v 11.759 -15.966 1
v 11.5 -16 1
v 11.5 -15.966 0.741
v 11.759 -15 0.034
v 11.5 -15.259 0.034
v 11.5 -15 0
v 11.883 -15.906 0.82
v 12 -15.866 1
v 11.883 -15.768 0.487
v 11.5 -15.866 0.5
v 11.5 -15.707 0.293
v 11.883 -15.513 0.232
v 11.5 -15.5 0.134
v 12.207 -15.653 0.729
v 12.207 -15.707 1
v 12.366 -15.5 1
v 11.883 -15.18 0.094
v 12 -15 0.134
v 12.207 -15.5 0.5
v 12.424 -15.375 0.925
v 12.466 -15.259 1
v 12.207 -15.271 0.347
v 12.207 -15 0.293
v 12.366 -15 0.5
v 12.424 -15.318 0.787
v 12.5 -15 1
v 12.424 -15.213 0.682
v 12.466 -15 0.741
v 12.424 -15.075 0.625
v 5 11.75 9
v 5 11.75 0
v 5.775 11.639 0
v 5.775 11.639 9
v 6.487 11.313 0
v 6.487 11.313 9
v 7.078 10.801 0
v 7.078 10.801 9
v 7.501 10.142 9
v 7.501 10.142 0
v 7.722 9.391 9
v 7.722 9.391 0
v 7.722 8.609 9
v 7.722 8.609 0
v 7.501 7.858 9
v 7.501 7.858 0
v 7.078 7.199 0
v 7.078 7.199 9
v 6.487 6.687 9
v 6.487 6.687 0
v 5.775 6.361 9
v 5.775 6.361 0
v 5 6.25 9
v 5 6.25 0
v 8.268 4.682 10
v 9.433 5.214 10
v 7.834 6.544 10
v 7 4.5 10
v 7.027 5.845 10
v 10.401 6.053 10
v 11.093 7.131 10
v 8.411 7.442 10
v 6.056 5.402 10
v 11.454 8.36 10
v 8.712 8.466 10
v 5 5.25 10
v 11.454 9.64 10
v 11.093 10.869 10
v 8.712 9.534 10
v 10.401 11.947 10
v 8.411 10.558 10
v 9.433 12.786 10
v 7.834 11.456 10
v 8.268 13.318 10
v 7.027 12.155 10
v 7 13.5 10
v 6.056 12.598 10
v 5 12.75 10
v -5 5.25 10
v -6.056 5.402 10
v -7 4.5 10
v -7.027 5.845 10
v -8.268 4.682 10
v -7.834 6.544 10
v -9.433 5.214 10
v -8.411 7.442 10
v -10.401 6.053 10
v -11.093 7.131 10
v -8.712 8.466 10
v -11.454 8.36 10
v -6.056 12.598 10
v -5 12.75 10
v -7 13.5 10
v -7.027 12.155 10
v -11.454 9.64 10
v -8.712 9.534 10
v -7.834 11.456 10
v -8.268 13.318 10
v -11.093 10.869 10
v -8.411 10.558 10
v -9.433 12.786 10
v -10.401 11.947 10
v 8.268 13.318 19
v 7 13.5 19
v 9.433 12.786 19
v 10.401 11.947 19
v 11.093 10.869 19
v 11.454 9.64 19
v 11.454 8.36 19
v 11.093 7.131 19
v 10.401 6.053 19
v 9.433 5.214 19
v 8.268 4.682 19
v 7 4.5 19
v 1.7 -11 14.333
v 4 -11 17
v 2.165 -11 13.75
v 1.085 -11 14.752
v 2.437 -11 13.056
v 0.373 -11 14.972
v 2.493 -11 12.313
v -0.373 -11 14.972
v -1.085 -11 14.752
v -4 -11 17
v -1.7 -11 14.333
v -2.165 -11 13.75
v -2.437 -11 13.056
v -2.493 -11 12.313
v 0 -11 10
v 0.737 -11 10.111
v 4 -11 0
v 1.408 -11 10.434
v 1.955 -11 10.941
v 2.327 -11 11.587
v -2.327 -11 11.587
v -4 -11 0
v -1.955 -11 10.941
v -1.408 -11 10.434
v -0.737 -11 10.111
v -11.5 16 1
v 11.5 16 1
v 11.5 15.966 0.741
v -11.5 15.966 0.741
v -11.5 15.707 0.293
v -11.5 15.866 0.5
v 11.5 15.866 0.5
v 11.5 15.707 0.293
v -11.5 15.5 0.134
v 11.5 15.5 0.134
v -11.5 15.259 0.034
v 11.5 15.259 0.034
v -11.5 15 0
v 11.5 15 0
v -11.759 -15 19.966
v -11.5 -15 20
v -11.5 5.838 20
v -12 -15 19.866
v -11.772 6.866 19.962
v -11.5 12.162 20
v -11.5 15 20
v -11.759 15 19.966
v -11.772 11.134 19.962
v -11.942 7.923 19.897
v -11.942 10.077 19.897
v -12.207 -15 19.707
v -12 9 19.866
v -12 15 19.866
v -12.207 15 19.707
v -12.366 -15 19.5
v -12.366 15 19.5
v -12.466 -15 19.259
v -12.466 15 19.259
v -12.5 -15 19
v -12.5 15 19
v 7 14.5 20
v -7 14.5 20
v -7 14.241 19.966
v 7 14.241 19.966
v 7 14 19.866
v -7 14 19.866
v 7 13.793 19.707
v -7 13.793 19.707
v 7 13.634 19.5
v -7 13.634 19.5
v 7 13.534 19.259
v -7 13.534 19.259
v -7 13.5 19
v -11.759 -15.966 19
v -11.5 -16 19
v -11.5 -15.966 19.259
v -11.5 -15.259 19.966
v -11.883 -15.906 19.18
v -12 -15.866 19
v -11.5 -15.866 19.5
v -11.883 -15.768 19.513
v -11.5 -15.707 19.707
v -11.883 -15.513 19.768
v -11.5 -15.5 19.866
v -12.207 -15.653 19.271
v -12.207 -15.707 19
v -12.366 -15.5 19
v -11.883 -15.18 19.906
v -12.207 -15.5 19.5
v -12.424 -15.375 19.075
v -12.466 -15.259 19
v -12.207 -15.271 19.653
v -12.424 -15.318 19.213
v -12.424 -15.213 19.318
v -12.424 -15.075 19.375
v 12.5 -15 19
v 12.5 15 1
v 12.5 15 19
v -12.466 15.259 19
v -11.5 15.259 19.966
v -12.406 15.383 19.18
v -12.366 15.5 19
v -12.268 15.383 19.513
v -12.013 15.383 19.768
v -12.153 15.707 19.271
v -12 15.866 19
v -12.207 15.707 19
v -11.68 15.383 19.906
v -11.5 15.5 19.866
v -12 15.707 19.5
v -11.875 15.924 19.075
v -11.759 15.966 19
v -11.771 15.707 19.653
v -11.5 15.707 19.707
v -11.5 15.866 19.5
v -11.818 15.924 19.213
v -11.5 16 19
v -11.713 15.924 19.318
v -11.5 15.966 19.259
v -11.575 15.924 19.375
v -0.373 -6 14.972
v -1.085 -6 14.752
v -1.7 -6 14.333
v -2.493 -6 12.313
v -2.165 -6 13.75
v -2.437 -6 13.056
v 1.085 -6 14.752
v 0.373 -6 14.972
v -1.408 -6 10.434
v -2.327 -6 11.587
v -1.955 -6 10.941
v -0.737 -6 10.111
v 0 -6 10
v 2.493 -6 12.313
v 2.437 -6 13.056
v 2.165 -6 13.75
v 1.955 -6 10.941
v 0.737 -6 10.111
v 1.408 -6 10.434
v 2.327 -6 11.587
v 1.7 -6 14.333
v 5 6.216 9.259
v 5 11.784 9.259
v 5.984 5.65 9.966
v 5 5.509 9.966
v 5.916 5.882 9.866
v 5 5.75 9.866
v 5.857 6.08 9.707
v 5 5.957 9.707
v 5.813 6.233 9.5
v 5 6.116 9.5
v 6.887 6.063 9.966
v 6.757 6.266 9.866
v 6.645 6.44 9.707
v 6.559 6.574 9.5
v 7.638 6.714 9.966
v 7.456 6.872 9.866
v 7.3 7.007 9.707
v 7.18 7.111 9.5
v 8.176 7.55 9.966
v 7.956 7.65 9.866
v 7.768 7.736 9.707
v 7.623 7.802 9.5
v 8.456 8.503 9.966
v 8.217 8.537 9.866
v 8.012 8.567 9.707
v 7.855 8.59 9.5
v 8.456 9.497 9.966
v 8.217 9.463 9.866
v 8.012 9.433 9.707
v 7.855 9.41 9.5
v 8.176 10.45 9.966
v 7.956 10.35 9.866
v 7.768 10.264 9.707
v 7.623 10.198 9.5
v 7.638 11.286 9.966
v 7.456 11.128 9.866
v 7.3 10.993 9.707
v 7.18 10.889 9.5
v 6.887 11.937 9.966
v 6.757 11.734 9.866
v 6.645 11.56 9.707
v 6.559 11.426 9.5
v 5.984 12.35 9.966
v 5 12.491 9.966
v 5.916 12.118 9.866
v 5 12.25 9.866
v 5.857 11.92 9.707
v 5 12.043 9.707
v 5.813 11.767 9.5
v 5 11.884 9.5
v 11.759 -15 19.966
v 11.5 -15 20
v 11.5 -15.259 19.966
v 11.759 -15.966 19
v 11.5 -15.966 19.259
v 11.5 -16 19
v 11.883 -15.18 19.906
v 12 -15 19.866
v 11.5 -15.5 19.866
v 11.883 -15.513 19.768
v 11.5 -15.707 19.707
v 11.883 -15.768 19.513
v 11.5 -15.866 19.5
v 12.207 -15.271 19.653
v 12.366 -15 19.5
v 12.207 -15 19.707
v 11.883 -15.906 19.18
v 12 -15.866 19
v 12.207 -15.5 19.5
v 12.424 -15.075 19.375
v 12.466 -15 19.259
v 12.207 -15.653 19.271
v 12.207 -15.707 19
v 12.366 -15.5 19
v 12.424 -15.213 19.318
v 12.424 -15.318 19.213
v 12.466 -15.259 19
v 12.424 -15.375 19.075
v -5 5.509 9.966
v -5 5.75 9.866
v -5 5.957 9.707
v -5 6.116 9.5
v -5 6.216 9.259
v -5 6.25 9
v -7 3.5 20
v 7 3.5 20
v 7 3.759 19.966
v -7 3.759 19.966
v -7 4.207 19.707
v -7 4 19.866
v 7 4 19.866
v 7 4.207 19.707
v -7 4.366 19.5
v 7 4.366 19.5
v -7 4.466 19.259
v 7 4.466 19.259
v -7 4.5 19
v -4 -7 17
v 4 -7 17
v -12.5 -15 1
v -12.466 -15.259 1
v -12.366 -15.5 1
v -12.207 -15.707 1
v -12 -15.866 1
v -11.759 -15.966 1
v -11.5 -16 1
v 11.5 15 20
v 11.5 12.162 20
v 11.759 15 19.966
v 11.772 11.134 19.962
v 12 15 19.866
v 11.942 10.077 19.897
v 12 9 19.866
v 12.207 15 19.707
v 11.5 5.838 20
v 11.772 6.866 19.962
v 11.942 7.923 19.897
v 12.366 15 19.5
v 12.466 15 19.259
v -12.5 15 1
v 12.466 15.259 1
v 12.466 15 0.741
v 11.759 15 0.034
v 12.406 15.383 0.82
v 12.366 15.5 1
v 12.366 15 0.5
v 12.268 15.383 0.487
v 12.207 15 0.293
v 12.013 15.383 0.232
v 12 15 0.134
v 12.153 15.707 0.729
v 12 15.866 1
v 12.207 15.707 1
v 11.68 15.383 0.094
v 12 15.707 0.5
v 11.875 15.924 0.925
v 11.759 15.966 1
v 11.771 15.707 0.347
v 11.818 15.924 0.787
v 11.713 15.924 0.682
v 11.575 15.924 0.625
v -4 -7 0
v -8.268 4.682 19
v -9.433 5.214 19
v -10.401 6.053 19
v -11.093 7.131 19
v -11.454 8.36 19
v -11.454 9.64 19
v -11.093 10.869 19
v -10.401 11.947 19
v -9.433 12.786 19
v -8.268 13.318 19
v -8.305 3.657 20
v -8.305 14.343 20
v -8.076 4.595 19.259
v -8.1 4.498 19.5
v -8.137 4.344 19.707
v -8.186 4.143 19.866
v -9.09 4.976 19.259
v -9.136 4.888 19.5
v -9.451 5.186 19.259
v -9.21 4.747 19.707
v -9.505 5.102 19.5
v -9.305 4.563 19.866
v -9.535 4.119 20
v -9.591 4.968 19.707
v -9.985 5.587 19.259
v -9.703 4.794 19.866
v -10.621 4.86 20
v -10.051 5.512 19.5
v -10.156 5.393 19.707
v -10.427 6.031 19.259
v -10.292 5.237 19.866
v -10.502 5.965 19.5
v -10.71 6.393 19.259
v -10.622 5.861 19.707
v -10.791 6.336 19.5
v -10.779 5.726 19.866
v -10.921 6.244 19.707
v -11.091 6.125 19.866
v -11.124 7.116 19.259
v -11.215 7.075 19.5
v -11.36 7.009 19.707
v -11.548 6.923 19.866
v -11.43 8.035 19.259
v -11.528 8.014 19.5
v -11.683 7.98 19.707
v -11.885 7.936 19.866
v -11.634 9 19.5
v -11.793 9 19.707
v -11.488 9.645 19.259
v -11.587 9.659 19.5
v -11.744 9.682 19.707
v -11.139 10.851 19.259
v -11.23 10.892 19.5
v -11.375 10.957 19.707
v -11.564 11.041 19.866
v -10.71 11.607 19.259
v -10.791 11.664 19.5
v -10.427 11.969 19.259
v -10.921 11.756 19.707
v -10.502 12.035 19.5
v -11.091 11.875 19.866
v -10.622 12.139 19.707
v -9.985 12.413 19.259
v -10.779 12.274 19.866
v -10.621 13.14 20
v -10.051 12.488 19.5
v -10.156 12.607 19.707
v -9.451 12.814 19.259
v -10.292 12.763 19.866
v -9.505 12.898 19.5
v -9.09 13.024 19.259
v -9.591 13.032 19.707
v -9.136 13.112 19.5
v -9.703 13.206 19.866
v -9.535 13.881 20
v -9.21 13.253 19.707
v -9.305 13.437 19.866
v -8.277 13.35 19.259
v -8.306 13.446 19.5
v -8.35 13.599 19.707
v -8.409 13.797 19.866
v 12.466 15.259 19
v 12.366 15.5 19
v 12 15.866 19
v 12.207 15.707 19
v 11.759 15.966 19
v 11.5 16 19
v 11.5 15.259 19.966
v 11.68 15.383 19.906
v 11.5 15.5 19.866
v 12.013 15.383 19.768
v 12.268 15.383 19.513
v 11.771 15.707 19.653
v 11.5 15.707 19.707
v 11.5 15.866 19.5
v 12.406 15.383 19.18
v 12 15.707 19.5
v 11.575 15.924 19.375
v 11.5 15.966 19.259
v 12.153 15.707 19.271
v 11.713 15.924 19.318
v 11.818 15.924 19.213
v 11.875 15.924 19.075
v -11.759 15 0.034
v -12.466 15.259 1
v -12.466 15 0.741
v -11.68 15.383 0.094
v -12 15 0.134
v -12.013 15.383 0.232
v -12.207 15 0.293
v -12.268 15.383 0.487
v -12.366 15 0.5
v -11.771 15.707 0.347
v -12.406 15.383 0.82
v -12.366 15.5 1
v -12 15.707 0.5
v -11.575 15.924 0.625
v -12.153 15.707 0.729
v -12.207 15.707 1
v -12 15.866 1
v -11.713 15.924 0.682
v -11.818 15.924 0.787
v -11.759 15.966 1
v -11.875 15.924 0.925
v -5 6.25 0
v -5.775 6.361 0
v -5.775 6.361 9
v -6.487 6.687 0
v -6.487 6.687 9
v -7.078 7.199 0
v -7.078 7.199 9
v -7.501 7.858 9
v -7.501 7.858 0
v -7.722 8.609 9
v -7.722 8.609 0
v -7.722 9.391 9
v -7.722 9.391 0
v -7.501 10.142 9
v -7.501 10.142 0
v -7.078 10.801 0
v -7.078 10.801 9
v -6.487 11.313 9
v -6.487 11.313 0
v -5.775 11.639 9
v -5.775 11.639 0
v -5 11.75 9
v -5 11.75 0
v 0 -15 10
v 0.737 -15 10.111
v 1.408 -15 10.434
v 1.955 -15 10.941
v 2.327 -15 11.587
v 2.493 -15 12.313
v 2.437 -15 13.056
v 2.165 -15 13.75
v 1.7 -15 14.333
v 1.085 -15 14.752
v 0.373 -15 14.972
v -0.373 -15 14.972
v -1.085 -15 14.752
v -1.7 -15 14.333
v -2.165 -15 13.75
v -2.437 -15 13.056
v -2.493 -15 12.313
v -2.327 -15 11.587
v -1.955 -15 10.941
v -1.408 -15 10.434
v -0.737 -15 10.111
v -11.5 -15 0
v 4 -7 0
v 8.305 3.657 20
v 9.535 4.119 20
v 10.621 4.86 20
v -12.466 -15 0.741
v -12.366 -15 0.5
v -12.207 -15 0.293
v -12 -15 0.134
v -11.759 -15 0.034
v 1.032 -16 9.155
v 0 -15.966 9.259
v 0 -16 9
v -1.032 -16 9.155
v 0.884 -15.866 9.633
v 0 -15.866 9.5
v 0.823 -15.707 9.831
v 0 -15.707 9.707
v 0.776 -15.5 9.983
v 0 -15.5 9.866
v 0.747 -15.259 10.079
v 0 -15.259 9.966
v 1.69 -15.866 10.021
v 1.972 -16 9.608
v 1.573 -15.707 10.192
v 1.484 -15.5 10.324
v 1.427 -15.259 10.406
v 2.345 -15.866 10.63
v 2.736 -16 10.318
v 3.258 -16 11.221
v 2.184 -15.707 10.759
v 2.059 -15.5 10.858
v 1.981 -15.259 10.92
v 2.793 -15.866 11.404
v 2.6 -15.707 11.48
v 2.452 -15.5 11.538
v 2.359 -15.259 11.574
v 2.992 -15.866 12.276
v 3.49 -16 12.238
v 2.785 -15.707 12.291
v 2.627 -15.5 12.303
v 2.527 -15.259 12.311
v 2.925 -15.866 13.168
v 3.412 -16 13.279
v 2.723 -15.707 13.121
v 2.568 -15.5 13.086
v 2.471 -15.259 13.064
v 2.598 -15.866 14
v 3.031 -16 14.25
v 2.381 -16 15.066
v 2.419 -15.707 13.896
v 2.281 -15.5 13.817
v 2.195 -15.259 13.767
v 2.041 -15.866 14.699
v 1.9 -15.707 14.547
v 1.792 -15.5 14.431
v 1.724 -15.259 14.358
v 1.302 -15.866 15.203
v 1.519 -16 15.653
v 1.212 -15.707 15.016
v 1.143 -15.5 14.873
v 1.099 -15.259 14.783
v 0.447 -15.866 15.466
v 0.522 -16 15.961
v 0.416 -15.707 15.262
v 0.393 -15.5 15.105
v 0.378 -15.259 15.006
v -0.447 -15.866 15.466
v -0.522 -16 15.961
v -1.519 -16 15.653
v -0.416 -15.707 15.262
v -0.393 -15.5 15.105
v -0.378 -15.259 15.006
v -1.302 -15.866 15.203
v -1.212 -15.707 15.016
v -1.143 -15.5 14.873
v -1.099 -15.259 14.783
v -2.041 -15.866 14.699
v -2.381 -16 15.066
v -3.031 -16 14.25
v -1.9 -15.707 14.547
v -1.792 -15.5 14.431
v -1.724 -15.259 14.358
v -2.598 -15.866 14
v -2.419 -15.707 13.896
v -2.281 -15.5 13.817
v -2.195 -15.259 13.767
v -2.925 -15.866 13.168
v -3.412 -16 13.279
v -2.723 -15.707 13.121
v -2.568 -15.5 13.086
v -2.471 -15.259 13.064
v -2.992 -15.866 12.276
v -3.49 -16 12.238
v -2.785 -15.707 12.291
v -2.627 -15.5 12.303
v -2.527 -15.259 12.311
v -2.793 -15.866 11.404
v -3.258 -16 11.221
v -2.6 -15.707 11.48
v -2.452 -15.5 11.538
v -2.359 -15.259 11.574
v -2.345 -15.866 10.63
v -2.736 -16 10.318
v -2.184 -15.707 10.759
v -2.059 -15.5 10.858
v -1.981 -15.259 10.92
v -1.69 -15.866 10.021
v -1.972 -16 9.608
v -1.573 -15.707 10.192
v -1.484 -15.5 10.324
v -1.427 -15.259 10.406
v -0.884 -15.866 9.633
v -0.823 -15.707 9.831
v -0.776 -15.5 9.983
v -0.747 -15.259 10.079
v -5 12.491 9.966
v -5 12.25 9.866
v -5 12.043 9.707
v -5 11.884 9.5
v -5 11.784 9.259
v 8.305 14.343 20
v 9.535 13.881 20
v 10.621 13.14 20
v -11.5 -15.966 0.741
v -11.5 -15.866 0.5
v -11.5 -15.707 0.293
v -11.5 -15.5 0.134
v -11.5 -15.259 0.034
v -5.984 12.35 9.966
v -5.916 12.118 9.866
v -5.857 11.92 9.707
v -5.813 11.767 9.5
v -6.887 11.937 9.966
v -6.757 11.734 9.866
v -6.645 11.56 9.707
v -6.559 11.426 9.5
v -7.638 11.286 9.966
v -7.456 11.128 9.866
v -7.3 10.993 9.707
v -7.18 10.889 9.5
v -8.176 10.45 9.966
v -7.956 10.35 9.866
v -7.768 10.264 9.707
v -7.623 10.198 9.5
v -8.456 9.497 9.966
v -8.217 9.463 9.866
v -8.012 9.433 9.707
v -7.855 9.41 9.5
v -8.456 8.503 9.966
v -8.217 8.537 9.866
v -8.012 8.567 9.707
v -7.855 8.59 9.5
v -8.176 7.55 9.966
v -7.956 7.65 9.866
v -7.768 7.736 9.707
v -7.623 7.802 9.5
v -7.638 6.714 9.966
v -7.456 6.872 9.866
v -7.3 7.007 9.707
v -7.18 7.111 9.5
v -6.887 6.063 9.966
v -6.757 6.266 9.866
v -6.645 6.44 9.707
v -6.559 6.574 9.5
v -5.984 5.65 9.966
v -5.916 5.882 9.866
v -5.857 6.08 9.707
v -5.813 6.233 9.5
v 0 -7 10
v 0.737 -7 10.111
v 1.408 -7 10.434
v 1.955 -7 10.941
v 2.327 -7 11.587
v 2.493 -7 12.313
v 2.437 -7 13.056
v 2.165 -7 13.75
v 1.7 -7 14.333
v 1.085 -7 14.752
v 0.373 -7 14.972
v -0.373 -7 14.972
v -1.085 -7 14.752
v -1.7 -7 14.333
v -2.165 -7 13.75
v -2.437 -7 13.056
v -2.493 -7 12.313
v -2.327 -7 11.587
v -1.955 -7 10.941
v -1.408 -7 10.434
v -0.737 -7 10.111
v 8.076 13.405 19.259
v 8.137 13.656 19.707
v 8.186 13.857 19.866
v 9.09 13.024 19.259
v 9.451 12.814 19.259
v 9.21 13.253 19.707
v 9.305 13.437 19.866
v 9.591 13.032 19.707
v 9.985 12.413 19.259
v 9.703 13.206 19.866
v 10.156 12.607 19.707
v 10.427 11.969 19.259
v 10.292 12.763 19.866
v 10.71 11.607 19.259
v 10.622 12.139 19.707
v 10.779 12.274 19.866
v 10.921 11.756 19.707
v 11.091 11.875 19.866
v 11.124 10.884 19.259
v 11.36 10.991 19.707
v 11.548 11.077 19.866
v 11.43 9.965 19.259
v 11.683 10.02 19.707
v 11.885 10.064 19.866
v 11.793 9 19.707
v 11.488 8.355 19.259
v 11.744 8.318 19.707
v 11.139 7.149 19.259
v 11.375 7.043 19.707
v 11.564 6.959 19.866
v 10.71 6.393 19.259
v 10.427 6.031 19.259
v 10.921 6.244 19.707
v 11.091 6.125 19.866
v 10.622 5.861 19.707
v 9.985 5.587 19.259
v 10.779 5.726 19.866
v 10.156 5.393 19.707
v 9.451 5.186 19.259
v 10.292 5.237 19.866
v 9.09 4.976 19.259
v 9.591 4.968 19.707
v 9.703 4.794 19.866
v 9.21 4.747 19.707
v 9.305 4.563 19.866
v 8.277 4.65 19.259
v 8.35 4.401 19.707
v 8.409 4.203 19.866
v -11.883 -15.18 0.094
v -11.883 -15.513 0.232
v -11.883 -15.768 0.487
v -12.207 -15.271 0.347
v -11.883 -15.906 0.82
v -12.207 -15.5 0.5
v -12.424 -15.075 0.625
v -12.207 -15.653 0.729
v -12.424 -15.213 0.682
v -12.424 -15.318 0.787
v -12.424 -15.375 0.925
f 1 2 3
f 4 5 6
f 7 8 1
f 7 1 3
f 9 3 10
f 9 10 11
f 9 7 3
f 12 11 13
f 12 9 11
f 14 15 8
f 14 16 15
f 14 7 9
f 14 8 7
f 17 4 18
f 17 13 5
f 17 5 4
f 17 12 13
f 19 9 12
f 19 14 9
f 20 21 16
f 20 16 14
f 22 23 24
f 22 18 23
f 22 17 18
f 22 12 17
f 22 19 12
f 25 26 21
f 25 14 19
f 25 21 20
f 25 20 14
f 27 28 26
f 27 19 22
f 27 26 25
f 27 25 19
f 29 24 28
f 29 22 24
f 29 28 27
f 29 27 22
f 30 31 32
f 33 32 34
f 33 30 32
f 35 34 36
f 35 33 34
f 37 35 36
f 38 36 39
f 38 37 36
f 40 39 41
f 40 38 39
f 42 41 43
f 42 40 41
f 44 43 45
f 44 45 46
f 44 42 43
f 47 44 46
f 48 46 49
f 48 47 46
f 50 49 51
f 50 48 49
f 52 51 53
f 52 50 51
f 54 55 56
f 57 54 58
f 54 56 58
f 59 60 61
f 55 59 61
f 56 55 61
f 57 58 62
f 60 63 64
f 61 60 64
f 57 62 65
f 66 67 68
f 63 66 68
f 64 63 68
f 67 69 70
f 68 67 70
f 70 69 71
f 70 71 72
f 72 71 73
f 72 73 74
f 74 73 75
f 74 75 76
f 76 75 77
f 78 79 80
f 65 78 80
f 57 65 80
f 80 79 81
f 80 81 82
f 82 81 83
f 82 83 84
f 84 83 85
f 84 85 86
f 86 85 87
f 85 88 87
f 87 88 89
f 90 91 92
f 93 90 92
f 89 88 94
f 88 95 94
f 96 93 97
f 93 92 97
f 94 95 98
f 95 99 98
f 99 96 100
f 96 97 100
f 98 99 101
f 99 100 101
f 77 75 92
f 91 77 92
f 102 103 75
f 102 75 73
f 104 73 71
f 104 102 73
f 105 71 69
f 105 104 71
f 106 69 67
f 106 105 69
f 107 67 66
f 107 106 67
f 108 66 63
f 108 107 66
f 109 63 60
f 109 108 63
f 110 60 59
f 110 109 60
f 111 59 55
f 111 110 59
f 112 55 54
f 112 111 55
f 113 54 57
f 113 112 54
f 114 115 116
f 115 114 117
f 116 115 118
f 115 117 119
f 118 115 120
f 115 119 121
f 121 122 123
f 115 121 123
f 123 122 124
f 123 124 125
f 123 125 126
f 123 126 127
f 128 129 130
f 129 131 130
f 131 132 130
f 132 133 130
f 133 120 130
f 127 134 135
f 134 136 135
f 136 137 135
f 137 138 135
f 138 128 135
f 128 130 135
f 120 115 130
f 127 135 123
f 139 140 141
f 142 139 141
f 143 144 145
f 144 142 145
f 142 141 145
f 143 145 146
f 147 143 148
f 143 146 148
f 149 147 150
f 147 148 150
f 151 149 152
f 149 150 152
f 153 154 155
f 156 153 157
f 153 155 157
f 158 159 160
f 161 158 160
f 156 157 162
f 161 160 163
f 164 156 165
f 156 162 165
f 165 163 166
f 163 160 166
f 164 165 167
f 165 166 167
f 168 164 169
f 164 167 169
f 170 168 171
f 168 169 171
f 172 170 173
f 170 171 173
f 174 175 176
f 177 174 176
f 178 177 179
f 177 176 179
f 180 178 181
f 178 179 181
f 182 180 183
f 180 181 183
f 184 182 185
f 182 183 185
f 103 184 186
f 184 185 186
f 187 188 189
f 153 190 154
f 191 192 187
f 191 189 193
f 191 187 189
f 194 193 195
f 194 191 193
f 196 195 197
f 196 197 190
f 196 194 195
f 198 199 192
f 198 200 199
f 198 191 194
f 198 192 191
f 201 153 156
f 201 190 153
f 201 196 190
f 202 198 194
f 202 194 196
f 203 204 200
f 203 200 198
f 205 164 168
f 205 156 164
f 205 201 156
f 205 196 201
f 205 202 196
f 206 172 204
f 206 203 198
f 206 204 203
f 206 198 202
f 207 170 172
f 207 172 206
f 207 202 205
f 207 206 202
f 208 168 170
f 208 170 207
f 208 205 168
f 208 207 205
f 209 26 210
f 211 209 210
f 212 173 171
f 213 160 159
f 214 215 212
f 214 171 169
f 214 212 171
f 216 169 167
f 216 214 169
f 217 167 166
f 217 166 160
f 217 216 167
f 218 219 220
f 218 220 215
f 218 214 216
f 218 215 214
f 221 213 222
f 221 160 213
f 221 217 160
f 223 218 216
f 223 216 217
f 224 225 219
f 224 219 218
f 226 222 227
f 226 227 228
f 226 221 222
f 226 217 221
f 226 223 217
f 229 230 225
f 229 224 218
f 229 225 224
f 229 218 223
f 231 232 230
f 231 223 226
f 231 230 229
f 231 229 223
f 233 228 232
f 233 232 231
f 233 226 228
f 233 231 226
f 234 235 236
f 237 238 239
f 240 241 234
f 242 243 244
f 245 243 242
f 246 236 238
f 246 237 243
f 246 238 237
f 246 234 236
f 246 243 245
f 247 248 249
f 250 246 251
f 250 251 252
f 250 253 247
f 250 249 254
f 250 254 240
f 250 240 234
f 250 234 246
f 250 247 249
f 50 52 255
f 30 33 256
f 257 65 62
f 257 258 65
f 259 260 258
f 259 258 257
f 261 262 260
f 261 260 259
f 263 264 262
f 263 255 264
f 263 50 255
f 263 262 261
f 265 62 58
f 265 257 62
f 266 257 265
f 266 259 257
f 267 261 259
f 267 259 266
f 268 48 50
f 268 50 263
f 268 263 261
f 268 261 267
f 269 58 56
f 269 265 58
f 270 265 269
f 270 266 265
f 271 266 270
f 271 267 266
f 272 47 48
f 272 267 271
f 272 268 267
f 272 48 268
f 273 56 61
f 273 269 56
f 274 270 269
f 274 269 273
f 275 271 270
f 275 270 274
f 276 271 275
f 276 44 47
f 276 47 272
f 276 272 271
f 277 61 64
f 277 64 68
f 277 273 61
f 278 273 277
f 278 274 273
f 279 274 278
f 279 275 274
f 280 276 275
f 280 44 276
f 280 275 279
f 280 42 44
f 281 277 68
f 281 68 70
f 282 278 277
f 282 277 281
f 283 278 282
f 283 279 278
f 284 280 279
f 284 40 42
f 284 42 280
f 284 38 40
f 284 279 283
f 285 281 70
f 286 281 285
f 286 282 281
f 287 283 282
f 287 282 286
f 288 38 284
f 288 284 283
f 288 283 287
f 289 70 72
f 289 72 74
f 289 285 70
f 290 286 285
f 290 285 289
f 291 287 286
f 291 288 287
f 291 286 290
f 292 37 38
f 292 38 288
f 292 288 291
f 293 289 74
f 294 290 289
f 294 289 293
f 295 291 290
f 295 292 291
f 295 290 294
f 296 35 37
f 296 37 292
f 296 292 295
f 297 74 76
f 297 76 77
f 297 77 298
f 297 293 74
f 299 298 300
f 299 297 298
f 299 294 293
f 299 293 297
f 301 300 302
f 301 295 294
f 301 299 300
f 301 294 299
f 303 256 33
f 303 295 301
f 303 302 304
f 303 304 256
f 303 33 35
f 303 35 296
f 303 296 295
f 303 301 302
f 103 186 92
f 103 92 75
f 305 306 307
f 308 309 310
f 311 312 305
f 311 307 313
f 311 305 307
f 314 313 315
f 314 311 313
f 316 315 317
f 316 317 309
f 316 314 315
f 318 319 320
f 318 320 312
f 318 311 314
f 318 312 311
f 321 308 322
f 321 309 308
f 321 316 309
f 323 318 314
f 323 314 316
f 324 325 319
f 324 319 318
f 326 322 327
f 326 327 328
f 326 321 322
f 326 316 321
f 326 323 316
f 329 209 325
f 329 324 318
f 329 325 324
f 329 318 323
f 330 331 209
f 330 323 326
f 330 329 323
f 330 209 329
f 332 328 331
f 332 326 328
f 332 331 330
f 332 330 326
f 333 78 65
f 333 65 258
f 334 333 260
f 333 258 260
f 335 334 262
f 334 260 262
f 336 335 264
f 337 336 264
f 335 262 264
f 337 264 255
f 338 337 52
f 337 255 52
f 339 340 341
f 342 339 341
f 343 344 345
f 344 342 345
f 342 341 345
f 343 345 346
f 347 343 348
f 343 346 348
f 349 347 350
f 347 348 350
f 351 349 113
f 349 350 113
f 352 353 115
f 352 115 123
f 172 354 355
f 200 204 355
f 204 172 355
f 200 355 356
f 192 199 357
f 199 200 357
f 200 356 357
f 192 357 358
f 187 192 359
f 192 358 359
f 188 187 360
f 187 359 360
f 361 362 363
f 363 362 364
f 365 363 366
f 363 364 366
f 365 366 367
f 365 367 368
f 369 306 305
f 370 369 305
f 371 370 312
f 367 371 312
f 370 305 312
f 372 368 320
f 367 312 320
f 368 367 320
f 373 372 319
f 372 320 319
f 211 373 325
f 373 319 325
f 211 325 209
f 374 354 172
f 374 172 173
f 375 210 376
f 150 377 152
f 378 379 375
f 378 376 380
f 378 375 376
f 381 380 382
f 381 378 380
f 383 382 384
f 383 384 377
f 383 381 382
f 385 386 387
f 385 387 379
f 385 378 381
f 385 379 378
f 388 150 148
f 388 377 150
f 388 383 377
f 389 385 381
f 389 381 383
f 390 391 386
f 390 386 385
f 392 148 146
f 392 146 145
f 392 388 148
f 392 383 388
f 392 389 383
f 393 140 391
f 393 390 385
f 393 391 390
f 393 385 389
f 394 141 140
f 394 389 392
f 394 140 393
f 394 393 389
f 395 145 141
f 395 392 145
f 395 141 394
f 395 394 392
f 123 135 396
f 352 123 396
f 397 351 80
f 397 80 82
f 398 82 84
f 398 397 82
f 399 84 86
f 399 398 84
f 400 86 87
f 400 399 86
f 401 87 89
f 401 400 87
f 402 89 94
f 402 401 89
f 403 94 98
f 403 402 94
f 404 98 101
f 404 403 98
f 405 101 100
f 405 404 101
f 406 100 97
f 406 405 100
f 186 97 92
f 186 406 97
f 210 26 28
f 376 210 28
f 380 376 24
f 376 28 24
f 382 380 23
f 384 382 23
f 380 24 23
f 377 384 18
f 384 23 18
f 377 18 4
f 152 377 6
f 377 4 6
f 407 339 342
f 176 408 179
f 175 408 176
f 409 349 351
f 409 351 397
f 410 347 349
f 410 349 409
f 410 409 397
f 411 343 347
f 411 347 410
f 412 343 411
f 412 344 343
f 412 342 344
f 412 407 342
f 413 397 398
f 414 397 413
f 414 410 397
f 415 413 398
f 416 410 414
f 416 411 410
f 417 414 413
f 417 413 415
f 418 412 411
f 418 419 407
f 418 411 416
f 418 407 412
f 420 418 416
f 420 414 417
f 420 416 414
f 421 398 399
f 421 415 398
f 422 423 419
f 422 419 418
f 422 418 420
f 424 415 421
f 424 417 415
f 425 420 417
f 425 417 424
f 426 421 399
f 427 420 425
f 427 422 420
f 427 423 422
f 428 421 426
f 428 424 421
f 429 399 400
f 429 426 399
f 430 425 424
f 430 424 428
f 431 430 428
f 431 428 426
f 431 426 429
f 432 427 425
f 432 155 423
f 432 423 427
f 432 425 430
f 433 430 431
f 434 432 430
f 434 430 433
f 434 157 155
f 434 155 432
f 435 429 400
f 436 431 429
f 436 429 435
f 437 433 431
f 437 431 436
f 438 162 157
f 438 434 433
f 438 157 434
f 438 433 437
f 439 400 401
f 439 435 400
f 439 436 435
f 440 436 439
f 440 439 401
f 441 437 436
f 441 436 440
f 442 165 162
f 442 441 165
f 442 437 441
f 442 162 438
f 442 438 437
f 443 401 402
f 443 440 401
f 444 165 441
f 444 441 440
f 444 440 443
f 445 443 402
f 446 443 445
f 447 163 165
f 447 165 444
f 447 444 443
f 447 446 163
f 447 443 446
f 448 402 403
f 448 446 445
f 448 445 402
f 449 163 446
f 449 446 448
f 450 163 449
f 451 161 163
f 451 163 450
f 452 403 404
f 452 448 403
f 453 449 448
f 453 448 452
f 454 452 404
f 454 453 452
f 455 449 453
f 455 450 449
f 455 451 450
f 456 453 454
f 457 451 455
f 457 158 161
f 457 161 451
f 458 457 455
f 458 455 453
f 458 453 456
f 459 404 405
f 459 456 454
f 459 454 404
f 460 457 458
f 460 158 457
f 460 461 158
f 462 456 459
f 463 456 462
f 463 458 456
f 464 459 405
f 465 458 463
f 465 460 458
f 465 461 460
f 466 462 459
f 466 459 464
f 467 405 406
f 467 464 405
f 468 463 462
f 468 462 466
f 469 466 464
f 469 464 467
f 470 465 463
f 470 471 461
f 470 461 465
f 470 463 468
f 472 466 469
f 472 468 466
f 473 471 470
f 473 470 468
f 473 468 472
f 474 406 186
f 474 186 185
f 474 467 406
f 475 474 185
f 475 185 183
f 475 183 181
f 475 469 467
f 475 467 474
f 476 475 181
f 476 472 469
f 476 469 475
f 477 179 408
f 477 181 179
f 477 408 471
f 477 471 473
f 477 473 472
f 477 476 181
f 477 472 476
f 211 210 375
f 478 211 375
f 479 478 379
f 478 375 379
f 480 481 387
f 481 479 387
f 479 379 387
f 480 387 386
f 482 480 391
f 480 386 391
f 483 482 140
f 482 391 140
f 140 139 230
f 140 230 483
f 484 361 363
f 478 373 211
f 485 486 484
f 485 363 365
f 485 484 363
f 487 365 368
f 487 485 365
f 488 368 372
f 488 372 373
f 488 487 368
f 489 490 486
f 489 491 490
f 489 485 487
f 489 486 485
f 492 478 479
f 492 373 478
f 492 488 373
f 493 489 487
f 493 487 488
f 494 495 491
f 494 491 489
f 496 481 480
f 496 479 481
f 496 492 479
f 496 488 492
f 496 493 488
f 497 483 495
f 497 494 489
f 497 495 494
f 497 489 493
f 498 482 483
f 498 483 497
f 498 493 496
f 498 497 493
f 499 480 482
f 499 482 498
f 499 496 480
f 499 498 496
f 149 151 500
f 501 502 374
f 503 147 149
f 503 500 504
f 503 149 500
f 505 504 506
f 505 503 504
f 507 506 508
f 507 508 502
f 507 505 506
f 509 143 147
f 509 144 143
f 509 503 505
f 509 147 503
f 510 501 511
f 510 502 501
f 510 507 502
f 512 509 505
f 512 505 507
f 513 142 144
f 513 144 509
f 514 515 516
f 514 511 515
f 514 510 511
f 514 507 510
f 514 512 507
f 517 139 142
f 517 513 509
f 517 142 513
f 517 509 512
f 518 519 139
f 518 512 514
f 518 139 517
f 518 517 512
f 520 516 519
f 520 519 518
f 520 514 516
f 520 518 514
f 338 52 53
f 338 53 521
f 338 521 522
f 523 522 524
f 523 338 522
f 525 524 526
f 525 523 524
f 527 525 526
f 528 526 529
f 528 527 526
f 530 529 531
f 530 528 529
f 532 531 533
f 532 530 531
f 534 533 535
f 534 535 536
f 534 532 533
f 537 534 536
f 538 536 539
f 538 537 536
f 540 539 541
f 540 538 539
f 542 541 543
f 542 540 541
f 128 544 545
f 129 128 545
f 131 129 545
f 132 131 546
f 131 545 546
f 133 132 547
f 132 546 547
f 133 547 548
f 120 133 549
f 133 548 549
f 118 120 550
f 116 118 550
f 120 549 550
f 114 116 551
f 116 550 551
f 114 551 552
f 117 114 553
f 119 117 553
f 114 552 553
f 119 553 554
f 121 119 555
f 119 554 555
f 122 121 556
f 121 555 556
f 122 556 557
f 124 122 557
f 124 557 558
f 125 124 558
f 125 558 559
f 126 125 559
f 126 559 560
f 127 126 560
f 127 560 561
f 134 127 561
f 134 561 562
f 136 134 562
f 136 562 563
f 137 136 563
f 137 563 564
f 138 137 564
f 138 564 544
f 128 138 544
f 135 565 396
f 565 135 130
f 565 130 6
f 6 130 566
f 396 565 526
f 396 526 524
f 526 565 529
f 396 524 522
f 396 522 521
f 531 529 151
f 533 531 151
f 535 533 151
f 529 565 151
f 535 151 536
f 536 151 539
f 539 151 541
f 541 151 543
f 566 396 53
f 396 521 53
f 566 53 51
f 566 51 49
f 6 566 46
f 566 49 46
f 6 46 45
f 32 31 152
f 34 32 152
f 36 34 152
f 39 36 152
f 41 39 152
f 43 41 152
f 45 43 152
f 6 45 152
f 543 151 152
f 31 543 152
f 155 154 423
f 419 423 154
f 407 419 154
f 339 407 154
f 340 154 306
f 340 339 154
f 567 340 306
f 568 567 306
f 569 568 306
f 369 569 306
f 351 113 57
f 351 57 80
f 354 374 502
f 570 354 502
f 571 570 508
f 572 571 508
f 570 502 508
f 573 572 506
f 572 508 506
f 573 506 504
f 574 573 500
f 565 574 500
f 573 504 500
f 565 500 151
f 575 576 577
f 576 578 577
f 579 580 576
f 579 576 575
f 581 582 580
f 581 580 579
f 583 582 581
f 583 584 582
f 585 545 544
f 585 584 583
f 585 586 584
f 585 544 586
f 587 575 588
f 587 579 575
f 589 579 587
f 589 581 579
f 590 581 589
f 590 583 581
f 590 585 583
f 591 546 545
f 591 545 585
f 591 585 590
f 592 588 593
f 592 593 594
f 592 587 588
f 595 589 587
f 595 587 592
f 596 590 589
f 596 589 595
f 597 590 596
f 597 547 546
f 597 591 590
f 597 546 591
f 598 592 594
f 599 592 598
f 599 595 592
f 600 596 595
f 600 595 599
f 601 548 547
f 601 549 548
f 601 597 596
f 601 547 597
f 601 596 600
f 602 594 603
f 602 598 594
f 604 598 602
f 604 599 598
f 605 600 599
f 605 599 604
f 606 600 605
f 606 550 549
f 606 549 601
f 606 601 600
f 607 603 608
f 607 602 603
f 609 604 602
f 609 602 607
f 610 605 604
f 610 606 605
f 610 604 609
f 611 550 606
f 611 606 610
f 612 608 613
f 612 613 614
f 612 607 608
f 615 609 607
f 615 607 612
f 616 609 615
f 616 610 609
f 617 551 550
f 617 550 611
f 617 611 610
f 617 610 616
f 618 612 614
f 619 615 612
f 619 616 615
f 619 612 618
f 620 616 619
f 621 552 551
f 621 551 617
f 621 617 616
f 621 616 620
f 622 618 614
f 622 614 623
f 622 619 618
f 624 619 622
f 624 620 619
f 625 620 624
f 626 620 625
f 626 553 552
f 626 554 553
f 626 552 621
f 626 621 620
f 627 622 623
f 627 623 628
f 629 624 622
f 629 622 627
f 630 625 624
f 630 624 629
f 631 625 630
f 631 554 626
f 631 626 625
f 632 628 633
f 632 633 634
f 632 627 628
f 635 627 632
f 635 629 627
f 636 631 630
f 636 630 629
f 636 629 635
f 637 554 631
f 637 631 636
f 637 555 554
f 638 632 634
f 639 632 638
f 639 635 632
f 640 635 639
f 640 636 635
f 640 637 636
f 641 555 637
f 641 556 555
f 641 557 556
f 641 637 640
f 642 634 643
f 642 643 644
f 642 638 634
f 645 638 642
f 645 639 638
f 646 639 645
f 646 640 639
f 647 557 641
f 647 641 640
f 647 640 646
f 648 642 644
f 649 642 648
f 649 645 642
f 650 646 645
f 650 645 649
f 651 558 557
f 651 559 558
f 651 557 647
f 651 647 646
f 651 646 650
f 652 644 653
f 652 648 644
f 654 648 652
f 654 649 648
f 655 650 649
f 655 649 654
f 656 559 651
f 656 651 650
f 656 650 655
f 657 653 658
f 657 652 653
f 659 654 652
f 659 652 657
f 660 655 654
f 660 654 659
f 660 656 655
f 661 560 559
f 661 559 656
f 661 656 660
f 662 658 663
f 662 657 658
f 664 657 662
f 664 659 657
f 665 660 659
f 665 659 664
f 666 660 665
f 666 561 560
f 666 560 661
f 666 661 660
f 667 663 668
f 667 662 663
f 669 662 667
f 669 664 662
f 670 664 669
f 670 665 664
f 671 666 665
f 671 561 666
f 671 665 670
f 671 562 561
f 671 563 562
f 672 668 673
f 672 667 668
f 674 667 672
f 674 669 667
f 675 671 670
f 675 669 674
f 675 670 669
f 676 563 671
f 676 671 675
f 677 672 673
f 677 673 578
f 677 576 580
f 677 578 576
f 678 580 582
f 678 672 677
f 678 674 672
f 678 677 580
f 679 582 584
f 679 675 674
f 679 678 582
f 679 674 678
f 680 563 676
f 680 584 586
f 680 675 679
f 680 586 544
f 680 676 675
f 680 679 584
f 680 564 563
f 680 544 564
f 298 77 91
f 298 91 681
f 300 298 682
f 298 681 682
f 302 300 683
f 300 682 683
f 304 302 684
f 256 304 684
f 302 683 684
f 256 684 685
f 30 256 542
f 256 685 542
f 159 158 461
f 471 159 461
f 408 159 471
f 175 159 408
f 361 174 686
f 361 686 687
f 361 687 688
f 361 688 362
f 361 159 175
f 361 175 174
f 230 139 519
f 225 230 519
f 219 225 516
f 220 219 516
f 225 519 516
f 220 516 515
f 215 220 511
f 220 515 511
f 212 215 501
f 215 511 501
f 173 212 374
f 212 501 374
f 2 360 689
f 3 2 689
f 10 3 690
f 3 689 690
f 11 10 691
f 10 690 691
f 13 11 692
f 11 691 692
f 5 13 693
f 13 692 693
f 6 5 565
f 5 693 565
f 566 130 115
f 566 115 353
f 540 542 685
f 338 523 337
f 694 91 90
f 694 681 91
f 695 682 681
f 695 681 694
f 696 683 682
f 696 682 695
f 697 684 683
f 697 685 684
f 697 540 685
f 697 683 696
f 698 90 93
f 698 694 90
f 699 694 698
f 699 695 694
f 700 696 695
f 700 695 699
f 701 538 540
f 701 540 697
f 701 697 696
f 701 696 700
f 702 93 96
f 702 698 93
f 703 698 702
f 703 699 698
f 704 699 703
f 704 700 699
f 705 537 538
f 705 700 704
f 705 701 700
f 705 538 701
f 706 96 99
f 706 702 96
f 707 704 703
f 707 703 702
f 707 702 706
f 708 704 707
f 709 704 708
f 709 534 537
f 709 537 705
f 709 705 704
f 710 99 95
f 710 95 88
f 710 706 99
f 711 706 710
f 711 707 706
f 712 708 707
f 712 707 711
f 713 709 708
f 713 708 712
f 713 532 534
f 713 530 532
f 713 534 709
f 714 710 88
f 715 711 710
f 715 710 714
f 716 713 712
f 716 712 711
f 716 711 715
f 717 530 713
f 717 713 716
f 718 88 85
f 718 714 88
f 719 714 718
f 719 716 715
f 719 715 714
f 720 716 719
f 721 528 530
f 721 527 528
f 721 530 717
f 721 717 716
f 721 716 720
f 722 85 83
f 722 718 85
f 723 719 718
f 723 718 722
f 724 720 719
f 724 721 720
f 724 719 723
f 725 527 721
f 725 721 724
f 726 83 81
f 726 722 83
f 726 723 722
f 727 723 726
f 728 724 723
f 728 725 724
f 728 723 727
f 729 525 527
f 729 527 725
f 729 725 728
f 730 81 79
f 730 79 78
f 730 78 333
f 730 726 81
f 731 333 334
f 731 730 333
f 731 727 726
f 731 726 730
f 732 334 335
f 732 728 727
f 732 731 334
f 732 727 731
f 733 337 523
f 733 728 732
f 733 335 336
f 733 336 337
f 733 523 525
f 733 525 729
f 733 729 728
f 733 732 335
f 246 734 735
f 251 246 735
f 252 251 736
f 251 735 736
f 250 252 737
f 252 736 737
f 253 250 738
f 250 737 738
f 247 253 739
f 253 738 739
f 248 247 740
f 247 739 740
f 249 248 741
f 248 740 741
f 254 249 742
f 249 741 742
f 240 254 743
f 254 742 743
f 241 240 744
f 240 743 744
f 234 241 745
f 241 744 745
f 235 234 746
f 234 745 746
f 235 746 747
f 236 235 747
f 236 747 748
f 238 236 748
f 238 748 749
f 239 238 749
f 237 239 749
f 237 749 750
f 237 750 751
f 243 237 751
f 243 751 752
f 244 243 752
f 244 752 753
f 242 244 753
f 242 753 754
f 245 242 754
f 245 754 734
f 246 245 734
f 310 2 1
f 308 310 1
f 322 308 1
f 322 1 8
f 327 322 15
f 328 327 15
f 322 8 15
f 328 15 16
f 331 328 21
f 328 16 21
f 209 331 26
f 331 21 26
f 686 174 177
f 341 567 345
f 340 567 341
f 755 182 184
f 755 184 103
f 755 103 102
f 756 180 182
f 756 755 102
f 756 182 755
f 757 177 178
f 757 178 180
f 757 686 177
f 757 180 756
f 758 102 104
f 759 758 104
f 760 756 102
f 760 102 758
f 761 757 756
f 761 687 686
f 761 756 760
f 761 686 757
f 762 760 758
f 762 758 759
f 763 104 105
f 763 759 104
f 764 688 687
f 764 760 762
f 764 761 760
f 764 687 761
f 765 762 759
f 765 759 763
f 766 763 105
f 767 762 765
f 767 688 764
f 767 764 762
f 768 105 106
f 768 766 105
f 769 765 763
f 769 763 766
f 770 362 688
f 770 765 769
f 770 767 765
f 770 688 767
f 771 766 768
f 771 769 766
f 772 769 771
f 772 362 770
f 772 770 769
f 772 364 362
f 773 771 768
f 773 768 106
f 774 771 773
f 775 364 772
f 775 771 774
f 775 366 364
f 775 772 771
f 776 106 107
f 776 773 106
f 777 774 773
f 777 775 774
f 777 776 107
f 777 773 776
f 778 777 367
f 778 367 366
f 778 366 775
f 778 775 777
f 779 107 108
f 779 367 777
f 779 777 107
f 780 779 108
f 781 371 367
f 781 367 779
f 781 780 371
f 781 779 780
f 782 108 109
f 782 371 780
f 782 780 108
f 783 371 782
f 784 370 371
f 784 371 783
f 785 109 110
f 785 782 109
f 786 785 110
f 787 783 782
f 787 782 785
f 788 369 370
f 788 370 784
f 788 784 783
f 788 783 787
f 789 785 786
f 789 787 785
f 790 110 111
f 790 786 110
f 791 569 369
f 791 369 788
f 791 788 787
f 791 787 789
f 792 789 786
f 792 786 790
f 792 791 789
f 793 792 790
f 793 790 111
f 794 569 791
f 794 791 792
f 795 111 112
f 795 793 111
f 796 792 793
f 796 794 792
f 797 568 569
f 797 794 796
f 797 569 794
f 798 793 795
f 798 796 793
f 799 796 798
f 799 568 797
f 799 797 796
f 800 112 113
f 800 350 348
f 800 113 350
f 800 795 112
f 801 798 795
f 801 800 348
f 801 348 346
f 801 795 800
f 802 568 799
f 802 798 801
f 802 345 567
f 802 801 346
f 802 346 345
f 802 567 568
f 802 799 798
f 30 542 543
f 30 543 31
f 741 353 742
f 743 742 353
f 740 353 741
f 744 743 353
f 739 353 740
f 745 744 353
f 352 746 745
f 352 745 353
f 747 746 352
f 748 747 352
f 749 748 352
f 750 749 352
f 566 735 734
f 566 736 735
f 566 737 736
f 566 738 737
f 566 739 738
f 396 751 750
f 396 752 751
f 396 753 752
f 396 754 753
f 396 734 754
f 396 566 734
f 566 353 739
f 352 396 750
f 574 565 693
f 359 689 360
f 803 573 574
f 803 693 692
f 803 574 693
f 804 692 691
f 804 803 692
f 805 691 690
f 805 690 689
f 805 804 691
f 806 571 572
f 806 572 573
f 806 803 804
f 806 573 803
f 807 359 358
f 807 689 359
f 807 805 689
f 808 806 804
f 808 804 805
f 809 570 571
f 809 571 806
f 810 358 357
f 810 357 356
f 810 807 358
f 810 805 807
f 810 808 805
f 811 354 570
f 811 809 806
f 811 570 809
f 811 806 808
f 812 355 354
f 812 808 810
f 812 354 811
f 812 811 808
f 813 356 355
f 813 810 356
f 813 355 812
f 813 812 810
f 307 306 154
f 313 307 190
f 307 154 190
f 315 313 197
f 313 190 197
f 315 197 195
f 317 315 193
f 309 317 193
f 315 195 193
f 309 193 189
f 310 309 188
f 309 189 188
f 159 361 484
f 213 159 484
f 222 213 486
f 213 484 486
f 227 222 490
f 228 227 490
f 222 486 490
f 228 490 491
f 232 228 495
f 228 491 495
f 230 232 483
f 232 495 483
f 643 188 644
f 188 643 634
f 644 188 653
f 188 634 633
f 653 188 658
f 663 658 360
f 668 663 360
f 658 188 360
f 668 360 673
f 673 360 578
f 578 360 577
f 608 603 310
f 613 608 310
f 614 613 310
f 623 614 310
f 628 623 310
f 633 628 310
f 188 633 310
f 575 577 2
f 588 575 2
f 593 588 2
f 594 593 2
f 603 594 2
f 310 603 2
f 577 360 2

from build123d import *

# Parameters (mm, degrees)
CROQUIS1_W              = 25
CROQUIS1_H              = 32
SALIENTE_EXTRUIR1_DEPTH = 20
CORTAR_EXTRUIR2_DEPTH   = 20
CORTAR_EXTRUIR3_DEPTH   = 10
CROQUIS9_R              = 2.5
CORTAR_EXTRUIR4_DEPTH   = 10
CROQUIS10_W             = 8
CROQUIS10_H             = 4
CORTAR_EXTRUIR5_DEPTH   = 17
REDONDEO1_R             = 1


with BuildPart() as part:
    # Croquis1 → Saliente-Extruir1 (new body)
    with BuildSketch(Plane.XY):
        Rectangle(CROQUIS1_W, CROQUIS1_H)
    extrude(amount=SALIENTE_EXTRUIR1_DEPTH)

    # Croquis7 → Cortar-Extruir2 (cut)
    with BuildSketch(Plane.XY.offset(20)):
        with BuildLine():
            Line((-5, 11.75), (5, 11.75))
            ThreePointArc((5, 11.75), (7.75, 9), (5, 6.25))
            Line((5, 6.25), (-5, 6.25))
            ThreePointArc((-5, 6.25), (-7.75, 9), (-5, 11.75))
        make_face()
    extrude(amount=-CORTAR_EXTRUIR2_DEPTH, mode=Mode.SUBTRACT)

    # Croquis8 → Cortar-Extruir3 (cut)
    with BuildSketch(Plane.XY.offset(20)):
        with BuildLine():
            Line((-7, 13.5), (7, 13.5))
            ThreePointArc((7, 13.5), (11.5, 9), (7, 4.5))
            Line((7, 4.5), (-7, 4.5))
            ThreePointArc((-7, 4.5), (-11.5, 9), (-7, 13.5))
        make_face()
    extrude(amount=-CORTAR_EXTRUIR3_DEPTH, mode=Mode.SUBTRACT)

    # Croquis9 → Cortar-Extruir4 (cut)
    with BuildSketch(Plane.XZ.offset(16)):
        with Locations(Location((0, 12.5, 0), (0, 0, 270))):
            Circle(CROQUIS9_R)
    extrude(amount=-CORTAR_EXTRUIR4_DEPTH, mode=Mode.SUBTRACT)

    # Croquis10 → Cortar-Extruir5 (cut)
    with BuildSketch(Plane(origin=(0, 0, 0), x_dir=(-1, 0, 0), z_dir=(0, 0, -1))):
        with Locations((0, -9)):
            Rectangle(CROQUIS10_W, CROQUIS10_H)
    extrude(amount=-CORTAR_EXTRUIR5_DEPTH, mode=Mode.SUBTRACT)

    # Redondeo1
    # the kernel refuses this fillet: 1 mm, written as the material it takes off along each edge
    with BuildSketch(Plane(origin=(11.5, -15, 19), x_dir=(0, 0, 1), z_dir=(1, 0, 0))) as redondeo1_piece_1_section:
        Polygon((0, 0), (REDONDEO1_R, 0), (REDONDEO1_R, REDONDEO1_R), (0, REDONDEO1_R), align=None)
    redondeo1_piece_1 = extrude(amount=REDONDEO1_R, mode=Mode.PRIVATE)
    redondeo1_piece_1 = redondeo1_piece_1 - Plane(origin=(11.5, -15, 19), x_dir=(0, 0.7071067811865475, -0.7071067811865475), z_dir=(1, 0, 0)) * Sphere(REDONDEO1_R, mode=Mode.PRIVATE)
    add(redondeo1_piece_1, mode=Mode.SUBTRACT)
    with BuildSketch(Plane(origin=(11.5, 15, 19), x_dir=(1, 0, 0), z_dir=(0, 1, 0))) as redondeo1_piece_2_section:
        Polygon((0, 0), (REDONDEO1_R, 0), (REDONDEO1_R, -REDONDEO1_R), (0, -REDONDEO1_R), align=None)
    redondeo1_piece_2 = extrude(amount=REDONDEO1_R, mode=Mode.PRIVATE)
    redondeo1_piece_2 = redondeo1_piece_2 - Plane(origin=(11.5, 15, 19), x_dir=(-0.7071067811865475, 0, -0.7071067811865475), z_dir=(0, 1, 0)) * Sphere(REDONDEO1_R, mode=Mode.PRIVATE)
    add(redondeo1_piece_2, mode=Mode.SUBTRACT)
    with BuildSketch(Plane(origin=(-11.5, 15, 19), x_dir=(-1, 0, 0), z_dir=(0, 1, 0))) as redondeo1_piece_3_section:
        Polygon((0, 0), (REDONDEO1_R, 0), (REDONDEO1_R, REDONDEO1_R), (0, REDONDEO1_R), align=None)
    redondeo1_piece_3 = extrude(amount=REDONDEO1_R, mode=Mode.PRIVATE)
    redondeo1_piece_3 = redondeo1_piece_3 - Plane(origin=(-11.5, 15, 19), x_dir=(0.7071067811865475, 0, -0.7071067811865475), z_dir=(0, 1, 0)) * Sphere(REDONDEO1_R, mode=Mode.PRIVATE)
    add(redondeo1_piece_3, mode=Mode.SUBTRACT)
    with BuildSketch(Plane(origin=(-11.5, -15, 19), x_dir=(0, 0, 1), z_dir=(-1, 0, 0))) as redondeo1_piece_4_section:
        Polygon((0, 0), (REDONDEO1_R, 0), (REDONDEO1_R, -REDONDEO1_R), (0, -REDONDEO1_R), align=None)
    redondeo1_piece_4 = extrude(amount=REDONDEO1_R, mode=Mode.PRIVATE)
    redondeo1_piece_4 = redondeo1_piece_4 - Plane(origin=(-11.5, -15, 19), x_dir=(0, 0.7071067811865475, -0.7071067811865475), z_dir=(-1, 0, 0)) * Sphere(REDONDEO1_R, mode=Mode.PRIVATE)
    add(redondeo1_piece_4, mode=Mode.SUBTRACT)
    with BuildSketch(Plane(origin=(11.5, 15, 1), x_dir=(1, 0, 0), z_dir=(0, 1, 0))) as redondeo1_piece_5_section:
        Polygon((0, 0), (REDONDEO1_R, 0), (REDONDEO1_R, REDONDEO1_R), (0, REDONDEO1_R), align=None)
    redondeo1_piece_5 = extrude(amount=REDONDEO1_R, mode=Mode.PRIVATE)
    redondeo1_piece_5 = redondeo1_piece_5 - Plane(origin=(11.5, 15, 1), x_dir=(-0.7071067811865475, 0, 0.7071067811865475), z_dir=(0, 1, 0)) * Sphere(REDONDEO1_R, mode=Mode.PRIVATE)
    add(redondeo1_piece_5, mode=Mode.SUBTRACT)
    with BuildSketch(Plane(origin=(-11.5, 15, 1), x_dir=(-1, 0, 0), z_dir=(0, 1, 0))) as redondeo1_piece_6_section:
        Polygon((0, 0), (REDONDEO1_R, 0), (REDONDEO1_R, -REDONDEO1_R), (0, -REDONDEO1_R), align=None)
    redondeo1_piece_6 = extrude(amount=REDONDEO1_R, mode=Mode.PRIVATE)
    redondeo1_piece_6 = redondeo1_piece_6 - Plane(origin=(-11.5, 15, 1), x_dir=(0.7071067811865475, 0, 0.7071067811865475), z_dir=(0, 1, 0)) * Sphere(REDONDEO1_R, mode=Mode.PRIVATE)
    add(redondeo1_piece_6, mode=Mode.SUBTRACT)
    with BuildSketch(Plane(origin=(11.5, -15, 1), x_dir=(0, 0, -1), z_dir=(1, 0, 0))) as redondeo1_piece_7_section:
        Polygon((0, 0), (REDONDEO1_R, 0), (REDONDEO1_R, -REDONDEO1_R), (0, -REDONDEO1_R), align=None)
    redondeo1_piece_7 = extrude(amount=REDONDEO1_R, mode=Mode.PRIVATE)
    redondeo1_piece_7 = redondeo1_piece_7 - Plane(origin=(11.5, -15, 1), x_dir=(0, 0.7071067811865475, 0.7071067811865475), z_dir=(1, 0, 0)) * Sphere(REDONDEO1_R, mode=Mode.PRIVATE)
    add(redondeo1_piece_7, mode=Mode.SUBTRACT)
    with BuildSketch(Plane(origin=(-11.5, -15, 1), x_dir=(0, 0, -1), z_dir=(-1, 0, 0))) as redondeo1_piece_8_section:
        Polygon((0, 0), (REDONDEO1_R, 0), (REDONDEO1_R, REDONDEO1_R), (0, REDONDEO1_R), align=None)
    redondeo1_piece_8 = extrude(amount=REDONDEO1_R, mode=Mode.PRIVATE)
    redondeo1_piece_8 = redondeo1_piece_8 - Plane(origin=(-11.5, -15, 1), x_dir=(0, 0.7071067811865475, 0.7071067811865475), z_dir=(-1, 0, 0)) * Sphere(REDONDEO1_R, mode=Mode.PRIVATE)
    add(redondeo1_piece_8, mode=Mode.SUBTRACT)
    with BuildSketch(Plane(origin=(12.5, -15, 20), x_dir=(0, 0, -1), z_dir=(0, 1, 0)), Plane(origin=(-12.5, 15, 20), x_dir=(0, 0, -1), z_dir=(0, -1, 0))) as redondeo1_piece_9:
        with BuildLine():
            CenterArc((REDONDEO1_R, REDONDEO1_R), REDONDEO1_R, 180, 90)
            Line((0, REDONDEO1_R), (0, 0))
            Line((0, 0), (REDONDEO1_R, 0))
        make_face()
    extrude(amount=30, mode=Mode.SUBTRACT)
    with BuildSketch(Plane(origin=(11.5, 16, 20), x_dir=(0, 0, -1), z_dir=(-1, 0, 0)), Plane(origin=(-11.5, -16, 0), x_dir=(0, 1, 0), z_dir=(1, 0, 0))) as redondeo1_piece_10:
        with BuildLine():
            CenterArc((REDONDEO1_R, REDONDEO1_R), REDONDEO1_R, 180, 90)
            Line((0, REDONDEO1_R), (0, 0))
            Line((0, 0), (REDONDEO1_R, 0))
        make_face()
    extrude(amount=23, mode=Mode.SUBTRACT)
    with BuildSketch(Plane(origin=(5, 6.25, 10), x_dir=(0, 0, -1), z_dir=(-1, 0, 0)), Plane(origin=(-5, 11.75, 10), x_dir=(0, 0, -1), z_dir=(1, 0, 0))) as redondeo1_piece_11:
        with BuildLine():
            CenterArc((REDONDEO1_R, REDONDEO1_R), REDONDEO1_R, 180, 90)
            Line((0, REDONDEO1_R), (0, 0))
            Line((0, 0), (REDONDEO1_R, 0))
        make_face()
    extrude(amount=10, mode=Mode.SUBTRACT)
    with BuildSketch(Plane(origin=(-7, 9, 20), x_dir=(0, -1, 0), z_dir=(1, 0, 0))) as redondeo1_piece_12:
        with BuildLine():
            CenterArc((4.5 + REDONDEO1_R, REDONDEO1_R), REDONDEO1_R, 180, 90)
            Line((4.5, REDONDEO1_R), (4.5, 0))
            Line((4.5, 0), (4.5 + REDONDEO1_R, 0))
        make_face()
    revolve(axis=Axis((-7, 9, 20), (0, 0, -1)), revolution_arc=180, mode=Mode.SUBTRACT)
    with BuildSketch(Plane(origin=(7, 4.5, 20), x_dir=(0, -1, 0), z_dir=(-1, 0, 0)), Plane(origin=(-7, 13.5, 20), x_dir=(0, 1, 0), z_dir=(1, 0, 0))) as redondeo1_piece_13:
        with BuildLine():
            CenterArc((REDONDEO1_R, -REDONDEO1_R), REDONDEO1_R, 90, 90)
            Line((0, -REDONDEO1_R), (0, 0))
            Line((0, 0), (REDONDEO1_R, 0))
        make_face()
    extrude(amount=14, mode=Mode.SUBTRACT)
    with BuildSketch(Plane(origin=(7, 9, 20), x_dir=(0, 1, 0), z_dir=(-1, 0, 0))) as redondeo1_piece_14:
        with BuildLine():
            CenterArc((4.5 + REDONDEO1_R, REDONDEO1_R), REDONDEO1_R, 180, 90)
            Line((4.5, REDONDEO1_R), (4.5, 0))
            Line((4.5, 0), (4.5 + REDONDEO1_R, 0))
        make_face()
    revolve(axis=Axis((7, 9, 20), (0, 0, -1)), revolution_arc=180, mode=Mode.SUBTRACT)
    with BuildSketch(Plane(origin=(-5, 9, 10), x_dir=(0, 1, 0), z_dir=(1, 0, 0))) as redondeo1_piece_15:
        with BuildLine():
            CenterArc((2.75 + REDONDEO1_R, -REDONDEO1_R), REDONDEO1_R, 90, 90)
            Line((2.75 + REDONDEO1_R, 0), (2.75, 0))
            Line((2.75, 0), (2.75, -REDONDEO1_R))
        make_face()
    revolve(axis=Axis((-5, 9, 10), (0, 0, 1)), revolution_arc=180, mode=Mode.SUBTRACT)
    with BuildSketch(Plane(origin=(5, 9, 10), x_dir=(0, -1, 0), z_dir=(-1, 0, 0))) as redondeo1_piece_16:
        with BuildLine():
            CenterArc((2.75 + REDONDEO1_R, -REDONDEO1_R), REDONDEO1_R, 90, 90)
            Line((2.75 + REDONDEO1_R, 0), (2.75, 0))
            Line((2.75, 0), (2.75, -REDONDEO1_R))
        make_face()
    revolve(axis=Axis((5, 9, 10), (0, 0, 1)), revolution_arc=180, mode=Mode.SUBTRACT)
    with BuildSketch(Plane(origin=(11.5, 16, 0), x_dir=(0, 0, 1), z_dir=(-1, 0, 0)), Plane(origin=(-11.5, -16, 20), x_dir=(0, 1, 0), z_dir=(1, 0, 0))) as redondeo1_piece_17:
        with BuildLine():
            CenterArc((REDONDEO1_R, -REDONDEO1_R), REDONDEO1_R, 90, 90)
            Line((0, -REDONDEO1_R), (0, 0))
            Line((0, 0), (REDONDEO1_R, 0))
        make_face()
    extrude(amount=23, mode=Mode.SUBTRACT)
    with BuildSketch(Plane(origin=(0, -16, 12.5), x_dir=(0, 0, -1), z_dir=(-1, 0, 0))) as redondeo1_piece_18:
        with BuildLine():
            CenterArc((2.5 + REDONDEO1_R, -REDONDEO1_R), REDONDEO1_R, 90, 90)
            Line((2.5, -REDONDEO1_R), (2.5, 0))
            Line((2.5, 0), (2.5 + REDONDEO1_R, 0))
        make_face()
    revolve(axis=Axis((0, -16, 12.5), (0, -1, 0)), mode=Mode.SUBTRACT)
    with BuildSketch(Plane(origin=(12.5, -15, 0), x_dir=(0, 0, 1), z_dir=(0, 1, 0)), Plane(origin=(-12.5, 15, 0), x_dir=(0, 0, 1), z_dir=(0, -1, 0))) as redondeo1_piece_19:
        with BuildLine():
            CenterArc((REDONDEO1_R, -REDONDEO1_R), REDONDEO1_R, 90, 90)
            Line((0, -REDONDEO1_R), (0, 0))
            Line((0, 0), (REDONDEO1_R, 0))
        make_face()
    extrude(amount=30, mode=Mode.SUBTRACT)
    with BuildSketch(Plane(origin=(-12.5, 16, 1), x_dir=(1, 0, 0), z_dir=(0, 0, 1)), Plane(origin=(-12.5, -16, 1), x_dir=(0, 1, 0), z_dir=(0, 0, 1))) as redondeo1_piece_20:
        with BuildLine():
            CenterArc((REDONDEO1_R, -REDONDEO1_R), REDONDEO1_R, 90, 90)
            Line((0, -REDONDEO1_R), (0, 0))
            Line((0, 0), (REDONDEO1_R, 0))
        make_face()
    extrude(amount=18, mode=Mode.SUBTRACT)
    with BuildSketch(Plane(origin=(12.5, 16, 1), x_dir=(-1, 0, 0), z_dir=(0, 0, 1)), Plane(origin=(12.5, -16, 1), x_dir=(0, 1, 0), z_dir=(0, 0, 1))) as redondeo1_piece_21:
        with BuildLine():
            CenterArc((REDONDEO1_R, REDONDEO1_R), REDONDEO1_R, 180, 90)
            Line((0, REDONDEO1_R), (0, 0))
            Line((0, 0), (REDONDEO1_R, 0))
        make_face()
    extrude(amount=18, mode=Mode.SUBTRACT)


solid = part.part
